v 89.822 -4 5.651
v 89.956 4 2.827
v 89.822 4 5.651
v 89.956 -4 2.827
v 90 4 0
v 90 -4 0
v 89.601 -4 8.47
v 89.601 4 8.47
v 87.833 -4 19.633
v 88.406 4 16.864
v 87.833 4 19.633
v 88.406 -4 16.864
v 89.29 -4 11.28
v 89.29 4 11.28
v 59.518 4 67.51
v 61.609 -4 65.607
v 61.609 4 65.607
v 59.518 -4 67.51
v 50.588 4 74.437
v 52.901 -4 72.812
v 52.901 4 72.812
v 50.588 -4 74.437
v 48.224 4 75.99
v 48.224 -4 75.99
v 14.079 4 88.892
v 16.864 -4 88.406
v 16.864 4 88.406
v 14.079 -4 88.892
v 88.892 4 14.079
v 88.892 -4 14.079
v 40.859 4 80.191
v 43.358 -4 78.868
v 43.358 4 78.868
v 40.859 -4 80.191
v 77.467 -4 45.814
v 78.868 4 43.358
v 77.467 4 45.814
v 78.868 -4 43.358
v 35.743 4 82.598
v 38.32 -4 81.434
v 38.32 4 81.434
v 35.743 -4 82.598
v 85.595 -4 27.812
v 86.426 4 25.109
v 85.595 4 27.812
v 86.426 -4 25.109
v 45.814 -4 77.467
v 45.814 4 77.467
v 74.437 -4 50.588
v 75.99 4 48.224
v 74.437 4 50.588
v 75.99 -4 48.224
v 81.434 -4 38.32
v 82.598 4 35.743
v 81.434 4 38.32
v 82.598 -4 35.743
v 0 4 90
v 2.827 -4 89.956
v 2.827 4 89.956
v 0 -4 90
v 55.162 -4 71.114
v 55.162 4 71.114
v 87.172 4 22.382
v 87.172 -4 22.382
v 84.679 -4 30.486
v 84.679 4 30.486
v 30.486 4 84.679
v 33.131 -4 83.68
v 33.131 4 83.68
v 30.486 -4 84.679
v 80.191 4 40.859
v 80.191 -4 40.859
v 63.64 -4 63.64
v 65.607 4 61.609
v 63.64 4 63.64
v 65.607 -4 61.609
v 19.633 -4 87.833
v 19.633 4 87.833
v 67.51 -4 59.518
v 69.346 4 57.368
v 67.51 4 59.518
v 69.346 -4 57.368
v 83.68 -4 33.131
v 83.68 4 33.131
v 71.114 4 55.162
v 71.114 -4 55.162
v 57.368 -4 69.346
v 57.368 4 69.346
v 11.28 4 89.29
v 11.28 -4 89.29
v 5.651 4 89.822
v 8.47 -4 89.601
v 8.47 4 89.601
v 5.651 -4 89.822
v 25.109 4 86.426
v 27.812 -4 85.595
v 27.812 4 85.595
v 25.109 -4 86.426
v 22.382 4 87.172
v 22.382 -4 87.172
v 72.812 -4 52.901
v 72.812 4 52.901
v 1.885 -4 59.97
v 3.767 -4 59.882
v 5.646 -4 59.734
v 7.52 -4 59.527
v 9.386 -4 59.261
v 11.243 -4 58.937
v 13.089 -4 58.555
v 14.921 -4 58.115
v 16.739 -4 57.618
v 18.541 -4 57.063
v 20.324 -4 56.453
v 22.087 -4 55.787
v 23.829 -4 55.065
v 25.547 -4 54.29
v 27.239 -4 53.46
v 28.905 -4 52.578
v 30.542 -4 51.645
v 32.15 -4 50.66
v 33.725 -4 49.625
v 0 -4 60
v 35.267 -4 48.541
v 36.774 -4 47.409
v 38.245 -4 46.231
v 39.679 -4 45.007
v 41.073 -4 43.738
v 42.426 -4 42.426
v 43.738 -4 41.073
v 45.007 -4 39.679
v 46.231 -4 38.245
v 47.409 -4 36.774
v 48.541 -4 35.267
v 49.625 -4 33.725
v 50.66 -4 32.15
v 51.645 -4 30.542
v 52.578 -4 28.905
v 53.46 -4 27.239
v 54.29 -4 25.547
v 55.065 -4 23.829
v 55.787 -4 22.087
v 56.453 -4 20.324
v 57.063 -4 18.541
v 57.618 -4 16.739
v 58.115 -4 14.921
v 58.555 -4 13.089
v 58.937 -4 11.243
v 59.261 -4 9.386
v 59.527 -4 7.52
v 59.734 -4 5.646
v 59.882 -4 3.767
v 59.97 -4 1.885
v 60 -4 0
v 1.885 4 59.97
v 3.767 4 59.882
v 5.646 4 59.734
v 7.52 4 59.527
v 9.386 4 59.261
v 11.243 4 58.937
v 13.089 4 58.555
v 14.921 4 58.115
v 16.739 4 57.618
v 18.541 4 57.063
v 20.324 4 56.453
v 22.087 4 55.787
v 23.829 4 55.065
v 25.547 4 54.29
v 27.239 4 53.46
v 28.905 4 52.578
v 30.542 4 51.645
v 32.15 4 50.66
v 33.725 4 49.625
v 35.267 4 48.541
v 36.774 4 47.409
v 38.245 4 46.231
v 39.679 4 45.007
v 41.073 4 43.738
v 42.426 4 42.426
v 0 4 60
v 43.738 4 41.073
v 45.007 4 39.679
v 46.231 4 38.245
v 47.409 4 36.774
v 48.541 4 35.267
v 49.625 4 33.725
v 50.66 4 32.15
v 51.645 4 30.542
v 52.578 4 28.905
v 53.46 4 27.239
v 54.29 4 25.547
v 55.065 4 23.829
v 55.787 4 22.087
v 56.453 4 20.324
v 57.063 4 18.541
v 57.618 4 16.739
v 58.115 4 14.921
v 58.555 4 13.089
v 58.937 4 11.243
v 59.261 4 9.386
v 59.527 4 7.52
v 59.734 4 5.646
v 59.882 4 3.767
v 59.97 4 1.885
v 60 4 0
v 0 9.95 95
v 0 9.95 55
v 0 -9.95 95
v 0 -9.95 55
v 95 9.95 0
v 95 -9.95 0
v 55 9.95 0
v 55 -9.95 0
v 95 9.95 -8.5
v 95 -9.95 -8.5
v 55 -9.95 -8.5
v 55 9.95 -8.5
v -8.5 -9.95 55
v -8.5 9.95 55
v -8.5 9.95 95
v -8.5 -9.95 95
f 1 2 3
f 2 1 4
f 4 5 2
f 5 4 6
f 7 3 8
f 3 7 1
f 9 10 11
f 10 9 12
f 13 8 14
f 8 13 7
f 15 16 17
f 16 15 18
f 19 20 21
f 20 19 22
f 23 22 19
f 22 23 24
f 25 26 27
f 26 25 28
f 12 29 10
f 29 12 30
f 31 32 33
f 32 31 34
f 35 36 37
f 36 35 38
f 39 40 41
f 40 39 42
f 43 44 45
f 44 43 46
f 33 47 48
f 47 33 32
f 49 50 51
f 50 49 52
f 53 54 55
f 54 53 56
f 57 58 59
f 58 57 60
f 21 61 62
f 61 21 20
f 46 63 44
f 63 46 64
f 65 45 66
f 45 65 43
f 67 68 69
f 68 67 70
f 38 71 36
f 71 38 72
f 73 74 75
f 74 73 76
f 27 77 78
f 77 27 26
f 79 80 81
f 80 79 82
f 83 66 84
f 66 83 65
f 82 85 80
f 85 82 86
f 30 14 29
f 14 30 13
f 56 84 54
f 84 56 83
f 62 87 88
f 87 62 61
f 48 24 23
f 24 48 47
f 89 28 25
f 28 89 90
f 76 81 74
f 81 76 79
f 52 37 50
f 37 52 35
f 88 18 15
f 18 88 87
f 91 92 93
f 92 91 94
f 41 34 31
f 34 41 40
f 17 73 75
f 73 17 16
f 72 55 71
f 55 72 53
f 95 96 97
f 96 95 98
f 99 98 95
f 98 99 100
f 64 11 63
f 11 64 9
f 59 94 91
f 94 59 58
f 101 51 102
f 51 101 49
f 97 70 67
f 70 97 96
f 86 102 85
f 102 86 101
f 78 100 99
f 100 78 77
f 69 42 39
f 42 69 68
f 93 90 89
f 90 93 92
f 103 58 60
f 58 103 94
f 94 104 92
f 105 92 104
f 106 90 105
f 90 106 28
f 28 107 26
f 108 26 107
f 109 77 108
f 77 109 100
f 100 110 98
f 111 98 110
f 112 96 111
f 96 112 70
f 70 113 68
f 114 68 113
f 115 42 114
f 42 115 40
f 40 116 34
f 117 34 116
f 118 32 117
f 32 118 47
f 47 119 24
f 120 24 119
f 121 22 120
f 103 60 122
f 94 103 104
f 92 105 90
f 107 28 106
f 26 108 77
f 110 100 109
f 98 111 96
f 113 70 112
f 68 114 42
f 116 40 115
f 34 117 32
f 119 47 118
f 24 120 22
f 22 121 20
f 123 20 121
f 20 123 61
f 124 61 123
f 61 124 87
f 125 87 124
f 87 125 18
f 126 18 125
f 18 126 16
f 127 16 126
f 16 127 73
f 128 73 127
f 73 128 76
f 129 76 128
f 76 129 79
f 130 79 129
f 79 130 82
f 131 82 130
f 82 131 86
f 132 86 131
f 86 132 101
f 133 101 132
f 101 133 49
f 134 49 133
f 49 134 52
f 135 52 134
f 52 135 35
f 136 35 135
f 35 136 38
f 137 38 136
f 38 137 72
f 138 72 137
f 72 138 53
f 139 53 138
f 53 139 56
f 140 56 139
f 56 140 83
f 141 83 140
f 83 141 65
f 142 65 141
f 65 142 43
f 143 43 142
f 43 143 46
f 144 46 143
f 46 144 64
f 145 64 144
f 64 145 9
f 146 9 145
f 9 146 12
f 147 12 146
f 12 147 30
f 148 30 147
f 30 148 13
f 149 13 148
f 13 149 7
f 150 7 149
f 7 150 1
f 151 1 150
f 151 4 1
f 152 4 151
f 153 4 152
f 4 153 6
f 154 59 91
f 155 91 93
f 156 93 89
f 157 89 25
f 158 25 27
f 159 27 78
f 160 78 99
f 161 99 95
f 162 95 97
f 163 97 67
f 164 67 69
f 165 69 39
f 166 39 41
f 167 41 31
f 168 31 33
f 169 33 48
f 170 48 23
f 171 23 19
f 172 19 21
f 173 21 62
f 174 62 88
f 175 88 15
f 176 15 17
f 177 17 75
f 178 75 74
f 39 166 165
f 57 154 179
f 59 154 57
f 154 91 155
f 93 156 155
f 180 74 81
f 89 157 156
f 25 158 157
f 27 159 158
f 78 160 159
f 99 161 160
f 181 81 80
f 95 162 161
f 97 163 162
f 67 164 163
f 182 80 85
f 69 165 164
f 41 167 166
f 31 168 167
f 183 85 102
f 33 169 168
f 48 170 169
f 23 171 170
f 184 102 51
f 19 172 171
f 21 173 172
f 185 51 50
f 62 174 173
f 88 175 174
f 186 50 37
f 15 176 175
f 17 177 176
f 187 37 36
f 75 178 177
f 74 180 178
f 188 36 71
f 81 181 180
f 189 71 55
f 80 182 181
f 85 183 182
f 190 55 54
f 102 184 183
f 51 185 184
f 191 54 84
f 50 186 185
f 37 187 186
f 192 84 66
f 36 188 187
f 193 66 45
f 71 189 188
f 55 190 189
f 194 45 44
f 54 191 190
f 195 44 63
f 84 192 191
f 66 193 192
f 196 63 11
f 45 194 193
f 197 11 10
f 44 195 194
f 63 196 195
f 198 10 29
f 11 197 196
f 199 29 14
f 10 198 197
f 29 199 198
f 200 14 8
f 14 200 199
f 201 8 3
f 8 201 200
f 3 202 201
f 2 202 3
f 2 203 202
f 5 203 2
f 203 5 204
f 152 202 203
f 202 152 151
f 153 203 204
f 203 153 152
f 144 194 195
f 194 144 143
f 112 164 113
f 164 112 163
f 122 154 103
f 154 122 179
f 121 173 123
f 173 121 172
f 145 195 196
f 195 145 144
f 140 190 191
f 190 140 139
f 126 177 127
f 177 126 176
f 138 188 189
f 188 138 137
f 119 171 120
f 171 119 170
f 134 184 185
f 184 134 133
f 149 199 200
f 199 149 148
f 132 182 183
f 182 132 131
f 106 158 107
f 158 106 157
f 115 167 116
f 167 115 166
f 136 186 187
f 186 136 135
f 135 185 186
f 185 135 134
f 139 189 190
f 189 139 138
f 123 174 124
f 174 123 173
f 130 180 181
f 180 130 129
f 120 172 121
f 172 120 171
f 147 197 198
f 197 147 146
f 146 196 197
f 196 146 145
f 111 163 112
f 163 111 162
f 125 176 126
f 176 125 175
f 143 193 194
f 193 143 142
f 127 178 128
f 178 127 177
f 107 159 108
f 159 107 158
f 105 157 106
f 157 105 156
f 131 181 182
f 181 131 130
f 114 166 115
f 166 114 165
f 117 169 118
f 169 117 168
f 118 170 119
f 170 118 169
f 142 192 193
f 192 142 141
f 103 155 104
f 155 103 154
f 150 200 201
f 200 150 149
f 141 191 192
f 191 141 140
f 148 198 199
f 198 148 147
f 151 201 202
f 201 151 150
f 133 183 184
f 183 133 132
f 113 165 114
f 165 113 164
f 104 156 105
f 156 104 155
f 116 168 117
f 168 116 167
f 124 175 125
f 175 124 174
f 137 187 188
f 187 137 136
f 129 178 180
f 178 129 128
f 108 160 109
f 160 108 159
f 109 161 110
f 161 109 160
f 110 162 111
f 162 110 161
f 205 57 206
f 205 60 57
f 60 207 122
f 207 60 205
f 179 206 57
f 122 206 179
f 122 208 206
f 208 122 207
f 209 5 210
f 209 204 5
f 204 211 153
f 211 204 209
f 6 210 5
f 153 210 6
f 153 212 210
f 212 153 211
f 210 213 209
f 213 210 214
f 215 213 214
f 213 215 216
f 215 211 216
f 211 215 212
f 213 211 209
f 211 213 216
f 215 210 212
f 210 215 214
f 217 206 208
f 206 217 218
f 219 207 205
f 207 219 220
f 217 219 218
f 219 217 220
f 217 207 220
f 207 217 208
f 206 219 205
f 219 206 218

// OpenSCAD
module canal(){
    cube([40,19.9,8.5]);    
}

module anclajes(){
    translate([55,-19.9 / 2,-8.5]) canal();
    rotate([0,-90,0]) translate([55,-19.9 / 2,0]) canal();
}

module arco(){
    intersection(){
        difference(){
            cylinder(h=8,r=90,$fn=200);
            translate([0,0,-0.001]) cylinder(h=8 + 0.002,r=60,$fn=200);
        }
        cube([120,120,20]);
    }
}

rotate([90,0,0]) translate([0,0,-8/2]) arco();
anclajes();
